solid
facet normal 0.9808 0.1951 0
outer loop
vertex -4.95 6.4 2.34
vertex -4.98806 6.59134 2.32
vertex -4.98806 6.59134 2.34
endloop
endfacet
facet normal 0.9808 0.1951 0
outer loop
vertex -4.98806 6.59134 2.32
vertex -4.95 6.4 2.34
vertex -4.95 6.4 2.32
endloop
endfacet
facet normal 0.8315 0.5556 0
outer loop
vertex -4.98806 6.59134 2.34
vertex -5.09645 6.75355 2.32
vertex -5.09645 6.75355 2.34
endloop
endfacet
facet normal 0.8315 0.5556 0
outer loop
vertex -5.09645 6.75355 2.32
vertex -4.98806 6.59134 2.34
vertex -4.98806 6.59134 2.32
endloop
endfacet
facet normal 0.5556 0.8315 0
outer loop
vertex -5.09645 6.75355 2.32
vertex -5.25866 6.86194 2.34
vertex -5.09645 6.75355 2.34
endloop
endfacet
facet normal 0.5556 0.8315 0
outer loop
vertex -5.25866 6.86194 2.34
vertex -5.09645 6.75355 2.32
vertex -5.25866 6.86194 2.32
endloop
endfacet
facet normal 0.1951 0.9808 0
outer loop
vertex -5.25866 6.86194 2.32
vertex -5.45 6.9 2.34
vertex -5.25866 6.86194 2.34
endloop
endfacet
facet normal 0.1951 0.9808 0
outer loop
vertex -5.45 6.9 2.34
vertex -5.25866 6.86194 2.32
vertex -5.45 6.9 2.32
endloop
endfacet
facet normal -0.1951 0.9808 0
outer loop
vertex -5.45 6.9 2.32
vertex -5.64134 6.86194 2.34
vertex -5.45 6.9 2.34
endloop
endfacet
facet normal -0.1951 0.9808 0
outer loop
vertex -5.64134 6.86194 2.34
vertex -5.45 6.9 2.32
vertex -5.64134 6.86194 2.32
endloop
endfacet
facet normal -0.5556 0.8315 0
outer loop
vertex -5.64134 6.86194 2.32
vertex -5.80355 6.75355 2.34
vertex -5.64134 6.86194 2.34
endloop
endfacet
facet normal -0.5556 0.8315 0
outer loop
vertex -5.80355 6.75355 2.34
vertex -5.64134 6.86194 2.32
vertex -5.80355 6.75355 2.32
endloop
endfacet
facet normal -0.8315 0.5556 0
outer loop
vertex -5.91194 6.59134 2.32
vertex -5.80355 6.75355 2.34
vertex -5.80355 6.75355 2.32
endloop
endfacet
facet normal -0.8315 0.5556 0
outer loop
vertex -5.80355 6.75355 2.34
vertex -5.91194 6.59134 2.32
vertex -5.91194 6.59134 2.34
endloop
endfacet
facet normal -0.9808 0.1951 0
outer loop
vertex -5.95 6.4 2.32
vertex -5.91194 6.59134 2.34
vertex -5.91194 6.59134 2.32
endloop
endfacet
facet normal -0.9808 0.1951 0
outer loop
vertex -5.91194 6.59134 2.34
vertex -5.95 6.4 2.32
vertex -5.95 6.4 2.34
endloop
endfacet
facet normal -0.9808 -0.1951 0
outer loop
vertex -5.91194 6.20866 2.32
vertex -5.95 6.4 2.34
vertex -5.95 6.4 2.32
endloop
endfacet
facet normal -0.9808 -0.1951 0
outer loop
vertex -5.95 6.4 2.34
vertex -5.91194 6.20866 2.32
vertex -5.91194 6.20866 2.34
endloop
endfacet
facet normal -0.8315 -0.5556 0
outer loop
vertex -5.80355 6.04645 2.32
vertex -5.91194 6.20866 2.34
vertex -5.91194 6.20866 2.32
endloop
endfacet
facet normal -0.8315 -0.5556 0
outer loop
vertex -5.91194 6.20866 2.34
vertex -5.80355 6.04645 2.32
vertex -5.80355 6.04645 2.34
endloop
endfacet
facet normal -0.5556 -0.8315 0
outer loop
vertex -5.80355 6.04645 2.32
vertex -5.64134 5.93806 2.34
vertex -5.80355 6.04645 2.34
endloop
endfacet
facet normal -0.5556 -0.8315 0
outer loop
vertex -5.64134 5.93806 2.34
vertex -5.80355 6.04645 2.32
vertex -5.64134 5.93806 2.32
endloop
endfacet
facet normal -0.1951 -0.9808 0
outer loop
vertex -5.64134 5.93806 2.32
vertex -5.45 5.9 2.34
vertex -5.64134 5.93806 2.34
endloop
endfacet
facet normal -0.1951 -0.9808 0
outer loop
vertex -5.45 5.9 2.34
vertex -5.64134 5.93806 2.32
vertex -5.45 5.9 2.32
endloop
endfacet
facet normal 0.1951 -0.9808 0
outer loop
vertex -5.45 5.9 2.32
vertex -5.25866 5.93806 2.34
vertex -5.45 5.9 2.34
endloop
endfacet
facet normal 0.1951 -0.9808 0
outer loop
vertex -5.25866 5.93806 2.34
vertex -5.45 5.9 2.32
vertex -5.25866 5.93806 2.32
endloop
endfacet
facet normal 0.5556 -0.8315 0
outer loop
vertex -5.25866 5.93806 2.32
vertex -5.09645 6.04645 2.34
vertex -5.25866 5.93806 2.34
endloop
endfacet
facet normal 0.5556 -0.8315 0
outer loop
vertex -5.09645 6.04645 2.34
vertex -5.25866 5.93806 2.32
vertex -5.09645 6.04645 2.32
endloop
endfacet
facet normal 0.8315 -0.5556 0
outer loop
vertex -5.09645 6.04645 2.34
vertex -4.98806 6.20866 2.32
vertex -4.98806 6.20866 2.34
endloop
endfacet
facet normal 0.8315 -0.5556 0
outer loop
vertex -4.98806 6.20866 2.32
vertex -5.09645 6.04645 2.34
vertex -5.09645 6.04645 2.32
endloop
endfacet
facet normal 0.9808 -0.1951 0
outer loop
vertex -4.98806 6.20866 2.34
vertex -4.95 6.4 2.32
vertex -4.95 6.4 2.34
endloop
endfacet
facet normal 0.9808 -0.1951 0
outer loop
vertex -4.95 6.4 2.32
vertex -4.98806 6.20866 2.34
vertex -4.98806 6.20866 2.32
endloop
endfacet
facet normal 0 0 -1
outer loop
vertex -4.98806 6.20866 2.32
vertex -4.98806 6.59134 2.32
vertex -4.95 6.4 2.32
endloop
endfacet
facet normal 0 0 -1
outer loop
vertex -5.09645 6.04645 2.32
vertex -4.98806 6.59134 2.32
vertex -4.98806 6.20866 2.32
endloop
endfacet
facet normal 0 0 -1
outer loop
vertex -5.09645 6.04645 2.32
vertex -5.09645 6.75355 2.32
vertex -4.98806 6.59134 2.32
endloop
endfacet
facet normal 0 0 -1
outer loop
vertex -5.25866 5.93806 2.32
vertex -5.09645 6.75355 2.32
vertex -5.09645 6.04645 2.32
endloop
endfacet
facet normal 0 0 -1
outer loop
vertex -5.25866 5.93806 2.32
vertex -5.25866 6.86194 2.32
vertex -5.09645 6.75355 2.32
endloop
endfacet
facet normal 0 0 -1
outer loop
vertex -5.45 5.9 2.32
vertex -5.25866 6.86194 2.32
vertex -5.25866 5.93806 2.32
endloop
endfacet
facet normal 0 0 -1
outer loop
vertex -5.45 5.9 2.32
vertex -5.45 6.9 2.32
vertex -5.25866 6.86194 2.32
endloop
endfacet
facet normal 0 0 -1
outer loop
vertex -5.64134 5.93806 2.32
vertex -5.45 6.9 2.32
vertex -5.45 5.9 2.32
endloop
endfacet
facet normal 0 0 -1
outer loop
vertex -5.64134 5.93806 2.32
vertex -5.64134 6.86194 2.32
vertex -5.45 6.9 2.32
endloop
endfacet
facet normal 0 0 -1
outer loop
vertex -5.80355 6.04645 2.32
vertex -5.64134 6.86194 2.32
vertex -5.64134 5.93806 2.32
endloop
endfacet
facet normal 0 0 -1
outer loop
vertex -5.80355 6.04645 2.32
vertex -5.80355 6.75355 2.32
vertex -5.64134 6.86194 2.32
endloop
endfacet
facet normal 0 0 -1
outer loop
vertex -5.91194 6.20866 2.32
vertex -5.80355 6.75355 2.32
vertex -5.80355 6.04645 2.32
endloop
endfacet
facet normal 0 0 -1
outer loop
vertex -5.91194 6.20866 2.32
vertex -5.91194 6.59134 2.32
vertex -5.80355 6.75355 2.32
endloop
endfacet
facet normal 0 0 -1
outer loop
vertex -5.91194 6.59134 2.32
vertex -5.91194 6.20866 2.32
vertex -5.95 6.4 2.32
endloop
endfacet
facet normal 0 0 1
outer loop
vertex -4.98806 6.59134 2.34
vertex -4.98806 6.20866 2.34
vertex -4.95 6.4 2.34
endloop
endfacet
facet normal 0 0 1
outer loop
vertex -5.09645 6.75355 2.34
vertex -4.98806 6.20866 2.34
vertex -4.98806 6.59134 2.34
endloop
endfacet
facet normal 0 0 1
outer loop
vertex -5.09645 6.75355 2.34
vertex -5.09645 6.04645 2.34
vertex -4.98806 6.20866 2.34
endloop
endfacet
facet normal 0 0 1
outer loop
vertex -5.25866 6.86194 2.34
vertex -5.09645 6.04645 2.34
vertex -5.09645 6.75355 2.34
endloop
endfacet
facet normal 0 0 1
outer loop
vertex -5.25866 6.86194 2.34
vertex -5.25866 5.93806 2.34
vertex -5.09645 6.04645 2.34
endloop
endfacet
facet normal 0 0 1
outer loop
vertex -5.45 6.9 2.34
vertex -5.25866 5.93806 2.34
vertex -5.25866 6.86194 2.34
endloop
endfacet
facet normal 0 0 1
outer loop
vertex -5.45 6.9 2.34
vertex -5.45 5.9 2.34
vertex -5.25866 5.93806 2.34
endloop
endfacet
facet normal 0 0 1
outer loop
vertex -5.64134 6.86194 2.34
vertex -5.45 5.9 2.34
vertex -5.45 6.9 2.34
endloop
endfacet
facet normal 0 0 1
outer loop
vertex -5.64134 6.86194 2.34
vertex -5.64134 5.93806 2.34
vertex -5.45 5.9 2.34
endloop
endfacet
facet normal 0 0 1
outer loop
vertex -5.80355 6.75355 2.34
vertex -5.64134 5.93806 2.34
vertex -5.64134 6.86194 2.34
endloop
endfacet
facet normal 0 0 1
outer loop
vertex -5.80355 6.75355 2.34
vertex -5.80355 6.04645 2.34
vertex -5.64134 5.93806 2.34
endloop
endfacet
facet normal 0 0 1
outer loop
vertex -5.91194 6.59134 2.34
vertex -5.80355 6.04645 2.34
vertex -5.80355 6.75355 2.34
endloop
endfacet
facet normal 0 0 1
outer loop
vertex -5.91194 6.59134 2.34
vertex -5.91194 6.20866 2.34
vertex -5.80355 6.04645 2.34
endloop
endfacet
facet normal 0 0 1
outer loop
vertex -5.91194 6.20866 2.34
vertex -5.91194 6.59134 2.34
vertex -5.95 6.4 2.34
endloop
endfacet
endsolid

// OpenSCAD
// file: defines.scad
// example012.stl is Mblock.stl, (c) 2009 Will Langford
// licensed under the Creative Commons - GNU GPL license.
// http://www.thingiverse.com/thing:753

//import("sim800c.stl", convexity=3);

// PCB

w = 15.7;
h = 17.0;
pin_fragments = 8;
// main file
// example012.stl is Mblock.stl, (c) 2009 Will Langford
// licensed under the Creative Commons - GNU GPL license.
// http://www.thingiverse.com/thing:753

//import("sim800c.stl", convexity=3);

// PCB

include <defines.scad>

color("Red")
  translate([-12.9/2 + 1,  14.8/2 - 1, 2.32])
    cylinder(r = 0.5, h = 0.02, $fn = 16);
